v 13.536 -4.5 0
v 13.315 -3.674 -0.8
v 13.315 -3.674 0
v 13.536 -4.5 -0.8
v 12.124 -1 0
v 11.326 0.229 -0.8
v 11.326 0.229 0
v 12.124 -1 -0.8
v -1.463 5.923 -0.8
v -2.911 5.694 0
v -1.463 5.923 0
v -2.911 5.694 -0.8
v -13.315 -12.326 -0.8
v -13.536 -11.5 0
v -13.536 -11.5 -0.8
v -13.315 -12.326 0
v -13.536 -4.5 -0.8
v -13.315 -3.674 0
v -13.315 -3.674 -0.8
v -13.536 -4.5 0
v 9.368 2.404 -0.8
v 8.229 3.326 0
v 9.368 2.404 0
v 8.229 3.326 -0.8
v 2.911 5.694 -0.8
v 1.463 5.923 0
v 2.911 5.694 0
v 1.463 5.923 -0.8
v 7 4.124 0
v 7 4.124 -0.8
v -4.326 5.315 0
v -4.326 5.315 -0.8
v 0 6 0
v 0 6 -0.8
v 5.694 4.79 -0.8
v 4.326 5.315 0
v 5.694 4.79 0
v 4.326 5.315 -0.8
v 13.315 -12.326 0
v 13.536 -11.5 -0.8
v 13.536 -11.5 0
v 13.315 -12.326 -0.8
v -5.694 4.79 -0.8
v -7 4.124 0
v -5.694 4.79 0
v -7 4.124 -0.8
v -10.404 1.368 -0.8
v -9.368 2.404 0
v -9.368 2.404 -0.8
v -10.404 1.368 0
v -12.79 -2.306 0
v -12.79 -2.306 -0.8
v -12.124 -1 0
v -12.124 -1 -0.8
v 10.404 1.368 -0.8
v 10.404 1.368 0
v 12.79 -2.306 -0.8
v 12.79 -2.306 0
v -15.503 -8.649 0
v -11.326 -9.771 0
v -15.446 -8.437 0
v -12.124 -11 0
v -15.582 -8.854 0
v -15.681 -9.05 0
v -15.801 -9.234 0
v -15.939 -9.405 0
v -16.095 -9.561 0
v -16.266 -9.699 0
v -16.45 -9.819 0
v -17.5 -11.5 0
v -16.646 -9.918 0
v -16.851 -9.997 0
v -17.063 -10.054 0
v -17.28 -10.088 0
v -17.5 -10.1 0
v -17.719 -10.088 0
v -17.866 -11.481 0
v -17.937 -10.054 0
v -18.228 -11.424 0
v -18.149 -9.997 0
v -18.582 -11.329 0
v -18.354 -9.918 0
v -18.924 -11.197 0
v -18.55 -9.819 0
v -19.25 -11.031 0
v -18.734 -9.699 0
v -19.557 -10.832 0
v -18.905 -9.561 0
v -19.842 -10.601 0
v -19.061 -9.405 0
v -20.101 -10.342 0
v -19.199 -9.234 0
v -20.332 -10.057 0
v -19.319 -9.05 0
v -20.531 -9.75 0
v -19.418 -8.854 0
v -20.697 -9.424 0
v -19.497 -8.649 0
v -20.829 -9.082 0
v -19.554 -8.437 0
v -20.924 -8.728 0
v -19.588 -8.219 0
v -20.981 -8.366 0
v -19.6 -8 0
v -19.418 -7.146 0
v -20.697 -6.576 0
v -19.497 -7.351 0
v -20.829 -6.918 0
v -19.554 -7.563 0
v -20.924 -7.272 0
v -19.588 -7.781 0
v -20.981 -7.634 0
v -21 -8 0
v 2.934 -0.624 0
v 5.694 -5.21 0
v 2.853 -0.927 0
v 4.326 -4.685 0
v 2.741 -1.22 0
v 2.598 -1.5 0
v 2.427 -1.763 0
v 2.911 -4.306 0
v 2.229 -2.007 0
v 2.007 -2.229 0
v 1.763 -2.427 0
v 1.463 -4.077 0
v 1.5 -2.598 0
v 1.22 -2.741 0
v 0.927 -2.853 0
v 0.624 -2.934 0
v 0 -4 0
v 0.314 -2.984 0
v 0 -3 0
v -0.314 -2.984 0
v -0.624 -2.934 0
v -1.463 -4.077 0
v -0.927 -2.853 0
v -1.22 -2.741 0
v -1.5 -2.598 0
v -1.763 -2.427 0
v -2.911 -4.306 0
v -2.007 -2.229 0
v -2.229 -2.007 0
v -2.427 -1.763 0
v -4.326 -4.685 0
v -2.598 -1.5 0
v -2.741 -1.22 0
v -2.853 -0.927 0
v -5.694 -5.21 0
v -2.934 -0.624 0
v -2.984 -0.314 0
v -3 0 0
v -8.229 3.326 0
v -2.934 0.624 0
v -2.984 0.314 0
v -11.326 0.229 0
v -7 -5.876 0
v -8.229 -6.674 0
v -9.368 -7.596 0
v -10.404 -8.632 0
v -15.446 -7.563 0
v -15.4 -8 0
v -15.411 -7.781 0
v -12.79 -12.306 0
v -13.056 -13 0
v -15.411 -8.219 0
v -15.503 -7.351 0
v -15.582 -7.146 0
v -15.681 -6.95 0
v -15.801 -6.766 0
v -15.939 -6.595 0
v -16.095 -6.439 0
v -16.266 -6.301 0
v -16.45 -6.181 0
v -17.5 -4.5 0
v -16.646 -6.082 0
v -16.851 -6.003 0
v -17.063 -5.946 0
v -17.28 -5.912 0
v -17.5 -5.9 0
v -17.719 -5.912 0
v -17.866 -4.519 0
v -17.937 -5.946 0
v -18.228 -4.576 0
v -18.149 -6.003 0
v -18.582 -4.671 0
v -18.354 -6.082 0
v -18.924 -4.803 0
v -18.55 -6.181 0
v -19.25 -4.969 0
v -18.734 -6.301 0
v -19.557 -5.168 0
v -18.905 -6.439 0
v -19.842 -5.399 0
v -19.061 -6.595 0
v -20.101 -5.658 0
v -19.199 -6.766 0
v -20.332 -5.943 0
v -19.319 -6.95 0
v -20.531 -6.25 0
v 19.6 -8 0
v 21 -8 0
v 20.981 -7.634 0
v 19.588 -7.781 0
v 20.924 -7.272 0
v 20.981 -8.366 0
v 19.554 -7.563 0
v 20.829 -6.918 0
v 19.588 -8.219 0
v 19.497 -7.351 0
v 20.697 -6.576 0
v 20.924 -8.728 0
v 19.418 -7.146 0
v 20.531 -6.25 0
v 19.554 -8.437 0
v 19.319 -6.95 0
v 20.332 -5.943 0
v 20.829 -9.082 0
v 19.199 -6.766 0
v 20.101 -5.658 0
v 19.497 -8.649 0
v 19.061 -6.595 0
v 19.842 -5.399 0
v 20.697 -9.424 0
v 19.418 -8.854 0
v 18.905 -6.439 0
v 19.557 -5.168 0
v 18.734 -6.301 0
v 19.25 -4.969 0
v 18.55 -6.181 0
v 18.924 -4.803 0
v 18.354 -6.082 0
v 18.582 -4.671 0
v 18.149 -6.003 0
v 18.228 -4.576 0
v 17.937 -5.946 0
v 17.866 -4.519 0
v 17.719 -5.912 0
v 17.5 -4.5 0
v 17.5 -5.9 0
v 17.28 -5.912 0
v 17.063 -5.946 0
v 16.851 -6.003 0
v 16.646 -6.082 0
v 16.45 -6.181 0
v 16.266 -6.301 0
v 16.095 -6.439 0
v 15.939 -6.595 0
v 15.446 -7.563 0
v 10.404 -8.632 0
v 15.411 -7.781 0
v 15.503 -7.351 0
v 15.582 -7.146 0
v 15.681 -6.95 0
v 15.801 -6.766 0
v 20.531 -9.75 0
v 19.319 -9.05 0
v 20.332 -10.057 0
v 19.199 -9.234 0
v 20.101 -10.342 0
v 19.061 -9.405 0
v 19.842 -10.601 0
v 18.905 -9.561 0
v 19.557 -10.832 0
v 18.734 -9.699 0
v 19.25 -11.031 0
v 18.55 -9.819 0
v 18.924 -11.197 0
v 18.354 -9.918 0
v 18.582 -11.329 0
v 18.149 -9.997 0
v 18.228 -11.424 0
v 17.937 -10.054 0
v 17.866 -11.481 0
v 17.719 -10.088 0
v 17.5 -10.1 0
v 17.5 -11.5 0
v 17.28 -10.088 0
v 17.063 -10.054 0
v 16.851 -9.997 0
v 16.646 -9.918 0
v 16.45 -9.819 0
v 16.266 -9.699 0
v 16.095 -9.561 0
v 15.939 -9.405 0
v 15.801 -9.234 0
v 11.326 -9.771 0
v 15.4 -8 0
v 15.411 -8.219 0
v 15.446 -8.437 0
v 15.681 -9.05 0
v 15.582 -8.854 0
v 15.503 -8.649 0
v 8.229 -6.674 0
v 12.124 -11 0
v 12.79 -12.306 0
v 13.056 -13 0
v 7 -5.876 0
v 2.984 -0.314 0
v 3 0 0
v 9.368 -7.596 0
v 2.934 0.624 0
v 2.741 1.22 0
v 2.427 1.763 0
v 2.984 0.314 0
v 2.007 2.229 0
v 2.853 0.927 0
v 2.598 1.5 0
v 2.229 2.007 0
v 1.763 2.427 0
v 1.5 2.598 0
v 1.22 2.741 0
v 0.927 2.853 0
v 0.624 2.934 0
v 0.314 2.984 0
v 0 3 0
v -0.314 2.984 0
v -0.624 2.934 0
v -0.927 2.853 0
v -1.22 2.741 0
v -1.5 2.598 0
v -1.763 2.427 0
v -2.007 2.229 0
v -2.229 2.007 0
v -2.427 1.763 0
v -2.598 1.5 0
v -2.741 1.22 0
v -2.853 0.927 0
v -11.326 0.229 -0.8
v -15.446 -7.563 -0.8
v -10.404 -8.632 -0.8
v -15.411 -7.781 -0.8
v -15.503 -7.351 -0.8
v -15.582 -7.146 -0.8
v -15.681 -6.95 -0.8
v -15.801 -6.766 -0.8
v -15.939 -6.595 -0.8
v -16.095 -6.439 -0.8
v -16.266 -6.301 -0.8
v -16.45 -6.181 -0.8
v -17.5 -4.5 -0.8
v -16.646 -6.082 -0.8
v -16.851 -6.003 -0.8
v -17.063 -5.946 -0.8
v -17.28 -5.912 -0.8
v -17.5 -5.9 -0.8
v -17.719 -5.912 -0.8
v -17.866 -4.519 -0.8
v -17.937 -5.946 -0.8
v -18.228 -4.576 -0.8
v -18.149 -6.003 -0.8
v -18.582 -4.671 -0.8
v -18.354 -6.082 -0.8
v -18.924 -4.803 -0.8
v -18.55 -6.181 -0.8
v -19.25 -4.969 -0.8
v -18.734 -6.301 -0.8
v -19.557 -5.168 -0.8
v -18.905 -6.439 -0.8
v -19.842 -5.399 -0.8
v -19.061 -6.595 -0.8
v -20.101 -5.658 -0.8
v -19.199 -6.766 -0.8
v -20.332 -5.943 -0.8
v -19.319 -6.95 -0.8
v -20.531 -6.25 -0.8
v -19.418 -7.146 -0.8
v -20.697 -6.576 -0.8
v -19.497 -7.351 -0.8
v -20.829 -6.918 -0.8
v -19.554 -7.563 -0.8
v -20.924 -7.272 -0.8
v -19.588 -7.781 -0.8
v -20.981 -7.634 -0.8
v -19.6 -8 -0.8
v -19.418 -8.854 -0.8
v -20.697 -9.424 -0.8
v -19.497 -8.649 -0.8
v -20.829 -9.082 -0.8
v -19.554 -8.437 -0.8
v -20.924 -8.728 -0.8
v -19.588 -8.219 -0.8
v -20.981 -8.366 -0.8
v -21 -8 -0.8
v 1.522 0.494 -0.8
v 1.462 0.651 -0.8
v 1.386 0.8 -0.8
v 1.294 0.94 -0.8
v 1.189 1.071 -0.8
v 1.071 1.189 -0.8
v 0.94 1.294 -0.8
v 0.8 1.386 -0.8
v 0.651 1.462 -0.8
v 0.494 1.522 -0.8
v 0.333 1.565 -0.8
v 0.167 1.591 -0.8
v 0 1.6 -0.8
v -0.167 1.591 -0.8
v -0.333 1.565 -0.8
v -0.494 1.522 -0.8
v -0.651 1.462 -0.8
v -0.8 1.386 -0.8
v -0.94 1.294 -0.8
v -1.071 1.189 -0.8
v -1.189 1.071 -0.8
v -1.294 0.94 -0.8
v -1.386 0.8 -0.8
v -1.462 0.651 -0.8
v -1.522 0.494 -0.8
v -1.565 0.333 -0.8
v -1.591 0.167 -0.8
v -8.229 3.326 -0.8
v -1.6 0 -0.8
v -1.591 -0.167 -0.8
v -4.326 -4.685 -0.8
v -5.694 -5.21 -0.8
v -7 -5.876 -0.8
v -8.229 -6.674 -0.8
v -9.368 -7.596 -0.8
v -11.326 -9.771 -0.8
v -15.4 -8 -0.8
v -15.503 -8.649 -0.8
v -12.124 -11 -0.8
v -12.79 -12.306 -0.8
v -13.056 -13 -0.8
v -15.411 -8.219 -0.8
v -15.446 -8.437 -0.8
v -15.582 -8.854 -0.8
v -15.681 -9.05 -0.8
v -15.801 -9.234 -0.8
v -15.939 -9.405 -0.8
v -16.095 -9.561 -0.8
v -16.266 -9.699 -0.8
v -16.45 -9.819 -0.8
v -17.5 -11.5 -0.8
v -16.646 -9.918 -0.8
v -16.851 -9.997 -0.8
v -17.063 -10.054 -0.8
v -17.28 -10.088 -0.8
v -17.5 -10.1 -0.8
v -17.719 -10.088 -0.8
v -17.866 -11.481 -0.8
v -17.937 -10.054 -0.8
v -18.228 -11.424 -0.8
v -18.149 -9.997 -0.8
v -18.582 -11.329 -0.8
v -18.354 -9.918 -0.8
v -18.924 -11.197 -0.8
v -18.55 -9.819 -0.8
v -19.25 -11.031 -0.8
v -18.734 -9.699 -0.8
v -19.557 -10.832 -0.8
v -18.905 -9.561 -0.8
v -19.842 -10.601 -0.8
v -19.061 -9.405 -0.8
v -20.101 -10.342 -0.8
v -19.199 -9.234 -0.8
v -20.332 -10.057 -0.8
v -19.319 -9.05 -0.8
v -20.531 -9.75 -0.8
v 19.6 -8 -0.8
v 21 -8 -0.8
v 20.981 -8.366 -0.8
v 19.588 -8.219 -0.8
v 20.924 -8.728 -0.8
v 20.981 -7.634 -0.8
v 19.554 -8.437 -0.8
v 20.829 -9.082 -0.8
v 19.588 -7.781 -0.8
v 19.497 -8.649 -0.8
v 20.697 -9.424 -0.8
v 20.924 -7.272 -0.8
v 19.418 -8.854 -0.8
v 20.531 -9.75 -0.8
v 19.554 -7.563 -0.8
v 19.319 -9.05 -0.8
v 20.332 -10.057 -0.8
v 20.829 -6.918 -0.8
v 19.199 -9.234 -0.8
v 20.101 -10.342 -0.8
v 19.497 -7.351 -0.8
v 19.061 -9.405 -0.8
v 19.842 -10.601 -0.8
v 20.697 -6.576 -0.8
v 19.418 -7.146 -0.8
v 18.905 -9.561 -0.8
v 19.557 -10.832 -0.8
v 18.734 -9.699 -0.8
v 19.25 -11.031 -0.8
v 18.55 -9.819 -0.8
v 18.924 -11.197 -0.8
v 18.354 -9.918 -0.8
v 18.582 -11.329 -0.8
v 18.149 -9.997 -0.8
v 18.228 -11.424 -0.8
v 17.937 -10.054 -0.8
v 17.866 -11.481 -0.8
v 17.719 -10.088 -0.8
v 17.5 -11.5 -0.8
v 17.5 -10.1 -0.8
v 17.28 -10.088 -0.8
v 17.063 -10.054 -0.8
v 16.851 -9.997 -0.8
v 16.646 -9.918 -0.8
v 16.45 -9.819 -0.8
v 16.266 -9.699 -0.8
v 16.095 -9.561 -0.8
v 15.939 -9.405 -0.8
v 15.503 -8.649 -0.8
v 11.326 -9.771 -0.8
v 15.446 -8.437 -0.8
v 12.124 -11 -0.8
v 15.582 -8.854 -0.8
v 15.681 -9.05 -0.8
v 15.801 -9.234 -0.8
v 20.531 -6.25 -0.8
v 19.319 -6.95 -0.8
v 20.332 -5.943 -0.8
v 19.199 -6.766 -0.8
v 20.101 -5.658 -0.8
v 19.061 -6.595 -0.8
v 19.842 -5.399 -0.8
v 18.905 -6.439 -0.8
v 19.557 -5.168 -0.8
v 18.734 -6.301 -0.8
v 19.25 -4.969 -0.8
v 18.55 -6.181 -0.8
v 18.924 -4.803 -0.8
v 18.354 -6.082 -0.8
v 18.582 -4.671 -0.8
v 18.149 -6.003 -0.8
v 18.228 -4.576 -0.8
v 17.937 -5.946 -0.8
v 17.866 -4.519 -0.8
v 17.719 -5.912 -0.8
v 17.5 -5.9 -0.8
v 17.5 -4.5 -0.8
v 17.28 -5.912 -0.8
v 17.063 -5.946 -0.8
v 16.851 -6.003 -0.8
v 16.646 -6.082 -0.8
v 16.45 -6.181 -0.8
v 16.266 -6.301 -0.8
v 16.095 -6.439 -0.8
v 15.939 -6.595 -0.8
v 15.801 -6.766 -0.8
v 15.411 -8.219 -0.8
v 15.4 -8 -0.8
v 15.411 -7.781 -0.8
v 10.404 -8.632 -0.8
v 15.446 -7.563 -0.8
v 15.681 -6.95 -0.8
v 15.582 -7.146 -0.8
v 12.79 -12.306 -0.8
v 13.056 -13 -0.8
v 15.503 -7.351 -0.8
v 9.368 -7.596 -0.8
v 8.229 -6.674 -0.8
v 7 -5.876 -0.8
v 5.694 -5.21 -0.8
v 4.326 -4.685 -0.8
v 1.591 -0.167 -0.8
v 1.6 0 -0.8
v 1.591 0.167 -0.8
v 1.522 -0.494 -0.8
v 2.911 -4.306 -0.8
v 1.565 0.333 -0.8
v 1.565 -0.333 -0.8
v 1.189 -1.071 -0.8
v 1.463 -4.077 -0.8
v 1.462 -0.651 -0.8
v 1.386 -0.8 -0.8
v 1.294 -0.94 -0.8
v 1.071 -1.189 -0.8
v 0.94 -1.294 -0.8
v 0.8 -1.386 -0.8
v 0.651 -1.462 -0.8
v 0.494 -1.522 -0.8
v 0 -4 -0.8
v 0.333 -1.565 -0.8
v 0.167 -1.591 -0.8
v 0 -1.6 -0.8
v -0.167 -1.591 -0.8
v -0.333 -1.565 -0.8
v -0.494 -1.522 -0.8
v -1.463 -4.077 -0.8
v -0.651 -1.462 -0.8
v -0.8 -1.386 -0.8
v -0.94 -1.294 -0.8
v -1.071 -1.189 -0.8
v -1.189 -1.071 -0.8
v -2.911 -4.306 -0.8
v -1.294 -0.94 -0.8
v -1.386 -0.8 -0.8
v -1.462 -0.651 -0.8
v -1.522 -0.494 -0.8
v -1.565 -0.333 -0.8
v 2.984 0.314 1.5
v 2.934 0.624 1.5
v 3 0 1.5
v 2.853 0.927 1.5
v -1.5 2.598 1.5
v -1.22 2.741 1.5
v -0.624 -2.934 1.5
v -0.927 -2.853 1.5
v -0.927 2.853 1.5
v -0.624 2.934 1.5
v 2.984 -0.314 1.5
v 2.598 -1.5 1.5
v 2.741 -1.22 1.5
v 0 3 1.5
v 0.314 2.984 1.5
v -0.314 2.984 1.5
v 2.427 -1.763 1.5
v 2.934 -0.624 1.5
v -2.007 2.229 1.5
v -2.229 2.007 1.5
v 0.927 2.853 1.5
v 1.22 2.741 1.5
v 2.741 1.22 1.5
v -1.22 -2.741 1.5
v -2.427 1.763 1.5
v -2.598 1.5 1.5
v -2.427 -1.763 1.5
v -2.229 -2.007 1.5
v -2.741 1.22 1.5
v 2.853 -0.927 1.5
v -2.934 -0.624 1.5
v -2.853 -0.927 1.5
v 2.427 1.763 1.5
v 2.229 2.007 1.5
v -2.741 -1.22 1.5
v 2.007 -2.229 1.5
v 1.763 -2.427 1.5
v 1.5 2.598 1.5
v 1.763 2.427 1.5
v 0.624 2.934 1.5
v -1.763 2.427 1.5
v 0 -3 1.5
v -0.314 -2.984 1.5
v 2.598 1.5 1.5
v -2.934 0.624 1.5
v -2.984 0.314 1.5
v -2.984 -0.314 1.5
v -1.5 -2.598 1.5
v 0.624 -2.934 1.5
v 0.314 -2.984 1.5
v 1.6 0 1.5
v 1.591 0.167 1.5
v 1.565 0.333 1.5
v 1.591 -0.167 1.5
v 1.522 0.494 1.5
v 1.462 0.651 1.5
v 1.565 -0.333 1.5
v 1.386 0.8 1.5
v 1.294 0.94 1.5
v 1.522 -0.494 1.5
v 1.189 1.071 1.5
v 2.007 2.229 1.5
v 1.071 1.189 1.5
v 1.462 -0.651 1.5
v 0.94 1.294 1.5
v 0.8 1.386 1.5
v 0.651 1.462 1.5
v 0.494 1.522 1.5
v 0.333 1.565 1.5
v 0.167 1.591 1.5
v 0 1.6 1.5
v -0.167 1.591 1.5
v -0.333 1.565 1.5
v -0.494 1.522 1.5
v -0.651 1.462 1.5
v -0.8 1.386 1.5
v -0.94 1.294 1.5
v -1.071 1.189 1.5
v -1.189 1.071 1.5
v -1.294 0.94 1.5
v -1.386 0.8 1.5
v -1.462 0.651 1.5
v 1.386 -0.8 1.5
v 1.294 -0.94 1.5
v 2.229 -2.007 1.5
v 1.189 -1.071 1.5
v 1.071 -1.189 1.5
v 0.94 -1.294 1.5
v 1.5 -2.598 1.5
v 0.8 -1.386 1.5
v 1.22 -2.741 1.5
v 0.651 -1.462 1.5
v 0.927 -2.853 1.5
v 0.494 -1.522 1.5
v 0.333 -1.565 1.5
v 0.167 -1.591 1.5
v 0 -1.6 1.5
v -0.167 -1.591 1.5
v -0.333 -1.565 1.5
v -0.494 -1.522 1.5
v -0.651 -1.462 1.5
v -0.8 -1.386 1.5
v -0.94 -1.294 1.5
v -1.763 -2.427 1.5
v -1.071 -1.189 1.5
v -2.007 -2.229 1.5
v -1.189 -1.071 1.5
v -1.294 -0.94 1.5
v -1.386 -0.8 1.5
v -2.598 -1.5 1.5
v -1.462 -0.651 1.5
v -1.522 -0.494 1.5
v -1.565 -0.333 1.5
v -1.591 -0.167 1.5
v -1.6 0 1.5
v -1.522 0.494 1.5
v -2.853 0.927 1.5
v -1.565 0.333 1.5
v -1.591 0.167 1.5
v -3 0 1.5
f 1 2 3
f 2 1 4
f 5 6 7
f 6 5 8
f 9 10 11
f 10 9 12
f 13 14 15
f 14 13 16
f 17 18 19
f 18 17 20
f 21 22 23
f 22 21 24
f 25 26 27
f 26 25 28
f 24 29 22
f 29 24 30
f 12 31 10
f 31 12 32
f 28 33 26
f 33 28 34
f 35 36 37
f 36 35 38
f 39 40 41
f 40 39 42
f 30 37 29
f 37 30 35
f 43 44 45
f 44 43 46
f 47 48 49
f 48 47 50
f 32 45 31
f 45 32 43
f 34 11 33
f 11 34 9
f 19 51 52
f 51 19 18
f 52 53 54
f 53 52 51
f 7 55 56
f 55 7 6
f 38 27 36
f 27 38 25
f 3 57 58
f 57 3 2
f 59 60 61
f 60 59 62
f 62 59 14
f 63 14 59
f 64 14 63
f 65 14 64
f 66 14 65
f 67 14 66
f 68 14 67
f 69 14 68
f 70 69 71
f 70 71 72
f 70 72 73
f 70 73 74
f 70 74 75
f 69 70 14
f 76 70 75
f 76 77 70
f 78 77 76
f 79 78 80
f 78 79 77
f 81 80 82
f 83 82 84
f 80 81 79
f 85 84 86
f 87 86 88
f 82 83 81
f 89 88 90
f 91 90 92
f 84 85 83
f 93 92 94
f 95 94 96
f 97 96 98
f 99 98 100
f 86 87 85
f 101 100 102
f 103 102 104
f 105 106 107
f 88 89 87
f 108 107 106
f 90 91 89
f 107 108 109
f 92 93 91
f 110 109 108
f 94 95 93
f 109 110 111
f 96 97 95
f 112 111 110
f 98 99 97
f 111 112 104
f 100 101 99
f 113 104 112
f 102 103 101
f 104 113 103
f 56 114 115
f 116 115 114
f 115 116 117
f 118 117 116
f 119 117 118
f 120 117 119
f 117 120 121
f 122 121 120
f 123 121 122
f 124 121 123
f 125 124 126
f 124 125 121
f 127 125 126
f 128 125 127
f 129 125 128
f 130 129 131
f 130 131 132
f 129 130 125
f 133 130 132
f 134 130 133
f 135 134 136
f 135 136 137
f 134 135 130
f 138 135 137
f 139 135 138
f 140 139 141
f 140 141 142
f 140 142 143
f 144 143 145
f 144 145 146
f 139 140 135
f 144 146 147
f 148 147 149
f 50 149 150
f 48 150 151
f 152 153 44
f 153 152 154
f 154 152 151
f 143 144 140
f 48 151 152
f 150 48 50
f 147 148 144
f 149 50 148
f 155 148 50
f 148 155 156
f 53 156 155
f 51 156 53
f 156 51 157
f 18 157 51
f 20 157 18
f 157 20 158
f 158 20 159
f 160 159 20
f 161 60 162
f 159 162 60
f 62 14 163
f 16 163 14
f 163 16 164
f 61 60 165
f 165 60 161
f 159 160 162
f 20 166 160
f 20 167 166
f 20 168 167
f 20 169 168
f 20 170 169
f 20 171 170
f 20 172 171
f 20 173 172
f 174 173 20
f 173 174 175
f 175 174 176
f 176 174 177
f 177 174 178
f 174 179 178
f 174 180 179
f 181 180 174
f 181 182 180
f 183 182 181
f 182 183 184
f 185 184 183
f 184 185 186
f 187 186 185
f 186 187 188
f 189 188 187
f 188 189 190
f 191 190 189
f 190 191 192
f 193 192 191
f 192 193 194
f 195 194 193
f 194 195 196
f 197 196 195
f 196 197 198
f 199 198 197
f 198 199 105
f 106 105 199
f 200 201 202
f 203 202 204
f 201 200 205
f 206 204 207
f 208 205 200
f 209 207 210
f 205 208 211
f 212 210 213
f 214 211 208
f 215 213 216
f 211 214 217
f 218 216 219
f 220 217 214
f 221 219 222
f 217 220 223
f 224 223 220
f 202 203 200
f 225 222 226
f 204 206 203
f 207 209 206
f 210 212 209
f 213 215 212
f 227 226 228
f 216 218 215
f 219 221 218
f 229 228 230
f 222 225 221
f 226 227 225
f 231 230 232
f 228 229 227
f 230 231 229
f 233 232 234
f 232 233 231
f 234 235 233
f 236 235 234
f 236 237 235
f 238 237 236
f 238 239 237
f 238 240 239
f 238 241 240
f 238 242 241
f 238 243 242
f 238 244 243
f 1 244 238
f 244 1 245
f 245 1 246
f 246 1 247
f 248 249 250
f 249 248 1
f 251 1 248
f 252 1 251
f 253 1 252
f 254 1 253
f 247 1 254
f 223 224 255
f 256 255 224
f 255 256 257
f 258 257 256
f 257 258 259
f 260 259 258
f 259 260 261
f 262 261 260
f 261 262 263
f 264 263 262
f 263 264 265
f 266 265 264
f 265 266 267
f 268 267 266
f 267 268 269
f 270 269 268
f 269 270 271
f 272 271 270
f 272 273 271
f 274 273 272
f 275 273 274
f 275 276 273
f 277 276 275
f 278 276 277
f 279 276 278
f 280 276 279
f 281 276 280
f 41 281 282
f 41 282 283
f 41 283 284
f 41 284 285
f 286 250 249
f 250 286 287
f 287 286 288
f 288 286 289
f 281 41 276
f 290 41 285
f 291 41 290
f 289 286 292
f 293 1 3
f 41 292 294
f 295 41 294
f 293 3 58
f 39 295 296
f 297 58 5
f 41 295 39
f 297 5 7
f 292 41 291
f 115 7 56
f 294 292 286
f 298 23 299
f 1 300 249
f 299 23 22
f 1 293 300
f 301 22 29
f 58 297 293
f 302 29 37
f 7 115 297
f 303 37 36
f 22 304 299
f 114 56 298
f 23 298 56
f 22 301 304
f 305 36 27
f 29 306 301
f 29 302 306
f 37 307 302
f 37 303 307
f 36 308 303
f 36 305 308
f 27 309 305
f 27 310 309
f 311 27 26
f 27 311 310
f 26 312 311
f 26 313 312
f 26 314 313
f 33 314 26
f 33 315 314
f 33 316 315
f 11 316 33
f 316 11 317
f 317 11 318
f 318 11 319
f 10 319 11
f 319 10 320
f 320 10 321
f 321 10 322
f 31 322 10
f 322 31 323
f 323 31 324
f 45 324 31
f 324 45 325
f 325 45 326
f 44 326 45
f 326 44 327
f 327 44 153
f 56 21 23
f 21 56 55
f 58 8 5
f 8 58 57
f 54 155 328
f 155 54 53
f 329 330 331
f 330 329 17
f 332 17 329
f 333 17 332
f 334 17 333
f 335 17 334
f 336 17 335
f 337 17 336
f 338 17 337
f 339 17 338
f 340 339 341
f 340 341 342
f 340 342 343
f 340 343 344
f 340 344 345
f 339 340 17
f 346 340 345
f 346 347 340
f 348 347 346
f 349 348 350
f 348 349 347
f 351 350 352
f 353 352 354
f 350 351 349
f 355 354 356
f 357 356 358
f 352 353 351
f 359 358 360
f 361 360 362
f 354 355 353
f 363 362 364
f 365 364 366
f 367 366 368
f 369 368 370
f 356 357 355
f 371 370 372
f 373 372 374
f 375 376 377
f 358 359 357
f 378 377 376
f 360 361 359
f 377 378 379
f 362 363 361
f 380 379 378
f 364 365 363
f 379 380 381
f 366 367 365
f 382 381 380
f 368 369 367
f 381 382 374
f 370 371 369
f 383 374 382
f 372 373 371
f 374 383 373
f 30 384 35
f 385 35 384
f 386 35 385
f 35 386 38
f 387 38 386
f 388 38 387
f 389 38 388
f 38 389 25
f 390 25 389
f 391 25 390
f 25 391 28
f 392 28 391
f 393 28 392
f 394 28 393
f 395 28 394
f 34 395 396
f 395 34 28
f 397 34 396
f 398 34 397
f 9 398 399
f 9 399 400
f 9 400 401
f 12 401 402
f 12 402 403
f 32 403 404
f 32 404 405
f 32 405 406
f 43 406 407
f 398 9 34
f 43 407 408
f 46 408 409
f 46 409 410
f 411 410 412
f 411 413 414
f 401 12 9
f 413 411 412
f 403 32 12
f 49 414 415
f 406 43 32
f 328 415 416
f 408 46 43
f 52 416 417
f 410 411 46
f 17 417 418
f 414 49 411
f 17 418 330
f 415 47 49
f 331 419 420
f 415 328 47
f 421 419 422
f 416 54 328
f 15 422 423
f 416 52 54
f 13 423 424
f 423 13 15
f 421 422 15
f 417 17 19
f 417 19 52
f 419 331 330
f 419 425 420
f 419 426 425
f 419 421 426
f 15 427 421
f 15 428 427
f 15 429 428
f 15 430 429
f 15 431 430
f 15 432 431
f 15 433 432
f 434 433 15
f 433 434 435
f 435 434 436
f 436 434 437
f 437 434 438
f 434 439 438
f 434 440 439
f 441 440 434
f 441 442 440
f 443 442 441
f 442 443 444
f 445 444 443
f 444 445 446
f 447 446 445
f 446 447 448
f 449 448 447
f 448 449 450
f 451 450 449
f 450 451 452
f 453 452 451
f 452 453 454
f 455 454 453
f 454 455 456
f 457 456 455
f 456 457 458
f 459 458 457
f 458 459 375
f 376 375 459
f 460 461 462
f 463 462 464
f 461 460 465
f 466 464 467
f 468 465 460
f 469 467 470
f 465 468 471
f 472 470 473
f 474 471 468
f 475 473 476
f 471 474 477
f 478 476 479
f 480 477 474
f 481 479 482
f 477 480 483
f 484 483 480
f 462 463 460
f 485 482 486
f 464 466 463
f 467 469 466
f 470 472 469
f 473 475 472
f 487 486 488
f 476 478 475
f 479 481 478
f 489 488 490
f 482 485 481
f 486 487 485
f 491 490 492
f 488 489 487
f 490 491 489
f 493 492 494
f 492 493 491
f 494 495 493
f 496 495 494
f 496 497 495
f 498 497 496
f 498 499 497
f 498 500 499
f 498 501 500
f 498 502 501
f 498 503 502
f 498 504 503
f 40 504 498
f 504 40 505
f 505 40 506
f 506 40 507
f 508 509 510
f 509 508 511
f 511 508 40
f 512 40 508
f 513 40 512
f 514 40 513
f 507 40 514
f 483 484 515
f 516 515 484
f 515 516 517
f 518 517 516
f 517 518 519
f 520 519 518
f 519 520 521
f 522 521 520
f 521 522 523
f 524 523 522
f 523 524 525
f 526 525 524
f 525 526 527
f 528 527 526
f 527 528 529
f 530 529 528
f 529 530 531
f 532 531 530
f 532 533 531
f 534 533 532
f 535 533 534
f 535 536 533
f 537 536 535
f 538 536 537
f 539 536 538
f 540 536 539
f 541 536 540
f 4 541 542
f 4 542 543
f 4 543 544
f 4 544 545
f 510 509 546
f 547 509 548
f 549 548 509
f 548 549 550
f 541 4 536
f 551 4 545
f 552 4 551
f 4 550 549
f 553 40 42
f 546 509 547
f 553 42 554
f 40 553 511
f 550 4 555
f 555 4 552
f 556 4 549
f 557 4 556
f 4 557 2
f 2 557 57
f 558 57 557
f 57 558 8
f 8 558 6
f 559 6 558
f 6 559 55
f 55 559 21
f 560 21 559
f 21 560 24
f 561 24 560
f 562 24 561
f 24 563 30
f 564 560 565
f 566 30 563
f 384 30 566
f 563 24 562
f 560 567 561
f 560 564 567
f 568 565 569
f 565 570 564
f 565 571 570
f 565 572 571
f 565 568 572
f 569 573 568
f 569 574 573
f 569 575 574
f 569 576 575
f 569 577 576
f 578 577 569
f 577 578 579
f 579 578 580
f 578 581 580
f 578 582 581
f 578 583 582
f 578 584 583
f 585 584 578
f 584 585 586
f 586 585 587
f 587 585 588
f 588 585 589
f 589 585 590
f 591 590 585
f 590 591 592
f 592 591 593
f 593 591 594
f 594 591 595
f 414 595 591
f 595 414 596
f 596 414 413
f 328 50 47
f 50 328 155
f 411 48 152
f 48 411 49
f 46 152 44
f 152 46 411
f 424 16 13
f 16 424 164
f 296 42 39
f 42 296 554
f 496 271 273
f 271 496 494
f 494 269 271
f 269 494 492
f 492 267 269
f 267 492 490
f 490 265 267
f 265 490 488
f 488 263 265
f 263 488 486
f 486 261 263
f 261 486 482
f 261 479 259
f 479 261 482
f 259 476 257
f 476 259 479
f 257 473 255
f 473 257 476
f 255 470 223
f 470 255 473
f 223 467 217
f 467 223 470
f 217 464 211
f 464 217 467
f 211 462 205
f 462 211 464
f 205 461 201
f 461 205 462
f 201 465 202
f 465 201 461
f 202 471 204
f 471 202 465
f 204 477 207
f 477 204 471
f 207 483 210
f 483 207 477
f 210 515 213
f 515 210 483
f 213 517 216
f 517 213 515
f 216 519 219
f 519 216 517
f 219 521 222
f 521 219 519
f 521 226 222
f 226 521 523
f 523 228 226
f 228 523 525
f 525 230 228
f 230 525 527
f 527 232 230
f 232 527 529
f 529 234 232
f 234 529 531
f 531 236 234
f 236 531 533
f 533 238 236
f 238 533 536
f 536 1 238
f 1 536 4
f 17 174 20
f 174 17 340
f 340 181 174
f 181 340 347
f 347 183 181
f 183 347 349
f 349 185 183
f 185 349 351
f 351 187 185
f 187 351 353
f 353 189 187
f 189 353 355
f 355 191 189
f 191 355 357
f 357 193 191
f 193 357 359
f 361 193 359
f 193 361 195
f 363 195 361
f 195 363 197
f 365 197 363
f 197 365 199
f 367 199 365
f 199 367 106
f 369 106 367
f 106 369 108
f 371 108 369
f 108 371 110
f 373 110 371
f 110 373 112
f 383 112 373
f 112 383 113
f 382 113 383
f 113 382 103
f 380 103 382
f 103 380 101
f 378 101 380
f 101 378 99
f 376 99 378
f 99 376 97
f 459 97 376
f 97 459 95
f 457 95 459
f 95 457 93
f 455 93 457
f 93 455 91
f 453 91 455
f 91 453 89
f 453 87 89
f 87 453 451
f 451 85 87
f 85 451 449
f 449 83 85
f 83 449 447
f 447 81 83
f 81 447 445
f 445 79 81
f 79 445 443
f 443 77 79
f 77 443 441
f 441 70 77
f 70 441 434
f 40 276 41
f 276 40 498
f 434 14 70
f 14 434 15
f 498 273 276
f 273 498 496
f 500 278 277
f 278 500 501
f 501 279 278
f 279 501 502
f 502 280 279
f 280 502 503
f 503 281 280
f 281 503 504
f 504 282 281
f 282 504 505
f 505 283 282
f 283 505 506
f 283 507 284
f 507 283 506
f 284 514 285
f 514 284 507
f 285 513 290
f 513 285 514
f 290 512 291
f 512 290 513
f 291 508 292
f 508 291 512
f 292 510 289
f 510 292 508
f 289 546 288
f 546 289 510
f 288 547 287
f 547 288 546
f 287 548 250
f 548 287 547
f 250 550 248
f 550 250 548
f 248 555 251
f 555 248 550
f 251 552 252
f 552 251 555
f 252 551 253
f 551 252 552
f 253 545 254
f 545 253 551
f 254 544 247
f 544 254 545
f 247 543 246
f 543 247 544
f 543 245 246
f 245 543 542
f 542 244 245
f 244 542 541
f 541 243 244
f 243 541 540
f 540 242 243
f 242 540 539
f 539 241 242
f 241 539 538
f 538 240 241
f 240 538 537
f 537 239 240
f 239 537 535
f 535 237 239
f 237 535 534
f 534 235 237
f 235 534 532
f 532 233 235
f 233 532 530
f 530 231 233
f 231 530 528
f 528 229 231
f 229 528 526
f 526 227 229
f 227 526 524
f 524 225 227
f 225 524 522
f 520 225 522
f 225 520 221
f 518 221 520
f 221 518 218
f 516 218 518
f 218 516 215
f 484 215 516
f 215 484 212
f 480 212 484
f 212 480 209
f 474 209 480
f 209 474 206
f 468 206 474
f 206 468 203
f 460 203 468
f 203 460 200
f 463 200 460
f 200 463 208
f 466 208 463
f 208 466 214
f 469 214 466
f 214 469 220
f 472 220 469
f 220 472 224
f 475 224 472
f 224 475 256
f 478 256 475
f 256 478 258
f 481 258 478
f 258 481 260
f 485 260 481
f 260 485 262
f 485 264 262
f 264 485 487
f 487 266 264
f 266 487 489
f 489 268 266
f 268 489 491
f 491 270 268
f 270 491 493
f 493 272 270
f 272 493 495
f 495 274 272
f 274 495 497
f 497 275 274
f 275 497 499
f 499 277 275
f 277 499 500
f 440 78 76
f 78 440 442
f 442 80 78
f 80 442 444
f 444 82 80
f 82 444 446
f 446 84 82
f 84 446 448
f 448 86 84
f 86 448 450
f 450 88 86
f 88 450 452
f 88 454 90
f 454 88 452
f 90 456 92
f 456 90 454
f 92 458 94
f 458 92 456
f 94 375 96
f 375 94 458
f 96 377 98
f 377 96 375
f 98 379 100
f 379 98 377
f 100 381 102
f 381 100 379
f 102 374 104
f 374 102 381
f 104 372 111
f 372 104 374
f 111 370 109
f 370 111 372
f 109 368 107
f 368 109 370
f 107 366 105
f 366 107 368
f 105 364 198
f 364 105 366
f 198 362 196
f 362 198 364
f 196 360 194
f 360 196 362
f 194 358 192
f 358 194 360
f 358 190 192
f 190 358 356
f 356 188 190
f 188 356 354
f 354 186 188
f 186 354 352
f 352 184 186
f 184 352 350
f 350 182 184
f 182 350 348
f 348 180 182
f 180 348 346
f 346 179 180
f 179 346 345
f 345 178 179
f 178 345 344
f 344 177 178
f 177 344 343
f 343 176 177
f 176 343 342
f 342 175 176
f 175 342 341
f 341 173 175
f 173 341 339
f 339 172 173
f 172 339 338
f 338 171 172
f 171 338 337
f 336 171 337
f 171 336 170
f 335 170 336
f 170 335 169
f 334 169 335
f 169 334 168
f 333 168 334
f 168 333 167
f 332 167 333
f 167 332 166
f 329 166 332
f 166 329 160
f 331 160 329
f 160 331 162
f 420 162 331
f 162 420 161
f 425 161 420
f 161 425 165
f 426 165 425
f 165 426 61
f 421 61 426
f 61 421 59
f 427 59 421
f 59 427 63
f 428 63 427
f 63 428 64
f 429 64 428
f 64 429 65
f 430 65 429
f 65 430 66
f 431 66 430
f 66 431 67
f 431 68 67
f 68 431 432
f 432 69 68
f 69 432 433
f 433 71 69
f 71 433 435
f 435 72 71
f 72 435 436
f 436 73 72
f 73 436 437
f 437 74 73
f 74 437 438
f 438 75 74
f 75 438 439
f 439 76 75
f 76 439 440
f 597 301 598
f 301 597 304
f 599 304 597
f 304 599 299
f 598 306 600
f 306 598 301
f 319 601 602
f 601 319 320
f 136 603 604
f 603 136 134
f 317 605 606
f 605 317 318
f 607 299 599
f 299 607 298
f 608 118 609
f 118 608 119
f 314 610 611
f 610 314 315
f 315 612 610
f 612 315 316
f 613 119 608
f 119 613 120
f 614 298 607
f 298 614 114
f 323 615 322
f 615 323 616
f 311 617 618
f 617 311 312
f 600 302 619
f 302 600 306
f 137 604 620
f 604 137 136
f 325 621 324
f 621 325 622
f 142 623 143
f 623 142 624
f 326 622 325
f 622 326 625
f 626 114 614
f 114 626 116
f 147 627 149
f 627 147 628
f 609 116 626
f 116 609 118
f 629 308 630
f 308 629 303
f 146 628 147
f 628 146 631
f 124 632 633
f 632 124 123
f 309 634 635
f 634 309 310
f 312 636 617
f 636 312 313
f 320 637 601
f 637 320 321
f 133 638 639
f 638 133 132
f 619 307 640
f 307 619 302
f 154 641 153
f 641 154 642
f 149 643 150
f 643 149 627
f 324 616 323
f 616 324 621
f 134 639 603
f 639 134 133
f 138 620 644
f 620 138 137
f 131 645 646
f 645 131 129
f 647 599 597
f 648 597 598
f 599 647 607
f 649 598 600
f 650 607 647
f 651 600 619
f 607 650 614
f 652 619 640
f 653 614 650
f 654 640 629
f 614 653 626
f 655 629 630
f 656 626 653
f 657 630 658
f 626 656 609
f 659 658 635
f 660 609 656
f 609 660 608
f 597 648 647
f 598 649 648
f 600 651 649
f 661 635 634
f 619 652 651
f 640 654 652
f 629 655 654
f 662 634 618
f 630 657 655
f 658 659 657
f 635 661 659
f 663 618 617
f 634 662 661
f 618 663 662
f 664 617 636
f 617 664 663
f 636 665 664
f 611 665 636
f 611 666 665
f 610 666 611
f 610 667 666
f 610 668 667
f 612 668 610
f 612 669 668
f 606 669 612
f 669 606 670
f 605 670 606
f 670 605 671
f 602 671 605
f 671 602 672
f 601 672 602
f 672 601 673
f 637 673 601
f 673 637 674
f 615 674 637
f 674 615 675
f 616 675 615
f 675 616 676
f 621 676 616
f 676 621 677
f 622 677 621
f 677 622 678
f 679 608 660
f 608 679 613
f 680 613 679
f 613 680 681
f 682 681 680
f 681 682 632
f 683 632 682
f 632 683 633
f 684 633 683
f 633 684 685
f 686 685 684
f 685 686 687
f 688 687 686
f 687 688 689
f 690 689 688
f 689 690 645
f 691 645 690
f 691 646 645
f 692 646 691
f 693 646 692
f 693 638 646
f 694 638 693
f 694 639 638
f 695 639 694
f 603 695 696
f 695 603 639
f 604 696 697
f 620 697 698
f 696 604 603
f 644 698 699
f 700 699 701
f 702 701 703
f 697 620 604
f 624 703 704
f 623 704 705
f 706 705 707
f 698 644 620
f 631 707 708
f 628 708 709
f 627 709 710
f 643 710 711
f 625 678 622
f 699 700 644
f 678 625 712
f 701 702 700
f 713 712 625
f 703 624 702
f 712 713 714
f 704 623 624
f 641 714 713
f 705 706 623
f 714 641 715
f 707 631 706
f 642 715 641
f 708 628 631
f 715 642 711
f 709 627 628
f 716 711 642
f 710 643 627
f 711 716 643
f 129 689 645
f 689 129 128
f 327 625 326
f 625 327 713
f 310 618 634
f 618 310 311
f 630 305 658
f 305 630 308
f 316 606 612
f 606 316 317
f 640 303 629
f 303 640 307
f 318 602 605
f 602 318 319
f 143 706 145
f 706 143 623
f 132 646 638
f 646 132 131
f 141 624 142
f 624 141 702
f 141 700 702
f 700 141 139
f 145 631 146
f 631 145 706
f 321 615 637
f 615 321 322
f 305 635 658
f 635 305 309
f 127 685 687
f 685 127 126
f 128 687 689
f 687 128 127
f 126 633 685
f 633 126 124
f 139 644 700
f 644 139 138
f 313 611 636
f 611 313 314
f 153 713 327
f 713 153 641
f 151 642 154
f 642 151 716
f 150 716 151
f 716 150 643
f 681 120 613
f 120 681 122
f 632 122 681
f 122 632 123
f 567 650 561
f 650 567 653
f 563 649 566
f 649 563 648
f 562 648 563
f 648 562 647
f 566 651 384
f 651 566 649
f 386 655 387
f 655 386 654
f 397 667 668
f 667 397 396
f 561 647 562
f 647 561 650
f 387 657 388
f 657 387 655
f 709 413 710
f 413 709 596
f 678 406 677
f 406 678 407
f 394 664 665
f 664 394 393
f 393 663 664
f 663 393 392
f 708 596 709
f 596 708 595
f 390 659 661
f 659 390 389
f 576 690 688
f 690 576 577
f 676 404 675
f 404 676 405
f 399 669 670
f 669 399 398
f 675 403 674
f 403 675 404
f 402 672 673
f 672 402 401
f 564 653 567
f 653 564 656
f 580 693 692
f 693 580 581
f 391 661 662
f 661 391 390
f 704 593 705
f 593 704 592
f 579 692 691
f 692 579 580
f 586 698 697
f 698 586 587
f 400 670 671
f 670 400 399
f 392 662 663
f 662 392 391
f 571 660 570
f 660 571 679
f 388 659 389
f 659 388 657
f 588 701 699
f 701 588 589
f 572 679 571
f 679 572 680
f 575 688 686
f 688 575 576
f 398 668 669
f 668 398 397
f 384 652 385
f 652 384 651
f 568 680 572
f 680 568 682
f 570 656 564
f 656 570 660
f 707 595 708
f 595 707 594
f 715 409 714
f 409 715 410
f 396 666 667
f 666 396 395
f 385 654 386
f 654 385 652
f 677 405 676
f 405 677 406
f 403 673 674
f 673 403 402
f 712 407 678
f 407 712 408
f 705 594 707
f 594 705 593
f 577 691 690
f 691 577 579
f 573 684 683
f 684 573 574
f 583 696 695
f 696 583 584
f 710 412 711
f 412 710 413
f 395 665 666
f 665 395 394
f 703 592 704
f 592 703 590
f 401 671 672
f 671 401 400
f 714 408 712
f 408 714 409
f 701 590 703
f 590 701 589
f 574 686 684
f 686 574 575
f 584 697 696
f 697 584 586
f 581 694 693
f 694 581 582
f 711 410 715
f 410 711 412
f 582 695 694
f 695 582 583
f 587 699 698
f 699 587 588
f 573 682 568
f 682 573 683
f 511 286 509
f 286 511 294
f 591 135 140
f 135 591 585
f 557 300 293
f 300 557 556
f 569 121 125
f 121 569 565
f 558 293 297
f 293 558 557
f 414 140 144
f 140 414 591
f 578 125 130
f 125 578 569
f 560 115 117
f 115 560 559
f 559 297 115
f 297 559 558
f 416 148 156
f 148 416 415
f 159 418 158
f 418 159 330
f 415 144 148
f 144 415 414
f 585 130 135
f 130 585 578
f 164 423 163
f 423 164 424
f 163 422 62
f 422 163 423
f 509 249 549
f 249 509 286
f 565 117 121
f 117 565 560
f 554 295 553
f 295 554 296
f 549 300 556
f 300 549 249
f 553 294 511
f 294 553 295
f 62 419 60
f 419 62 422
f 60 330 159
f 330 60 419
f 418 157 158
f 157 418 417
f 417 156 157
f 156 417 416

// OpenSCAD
/*
   Copyright 2015-2018 Scott Bezek and the splitflap contributors

   Licensed under the Apache License, Version 2.0 (the "License");
   you may not use this file except in compliance with the License.
   You may obtain a copy of the License at

       http://www.apache.org/licenses/LICENSE-2.0

   Unless required by applicable law or agreed to in writing, software
   distributed under the License is distributed on an "AS IS" BASIS,
   WITHOUT WARRANTIES OR CONDITIONS OF ANY KIND, either express or implied.
   See the License for the specific language governing permissions and
   limitations under the License.
*/

28byj48_chassis_radius = 28/2;
28byj48_chassis_height = 0.8;
28byj48_shaft_offset = 8;
28byj48_mount_outer_radius = 3.5;
28byj48_mount_hole_radius = 4.2/2;
28byj48_mount_center_offset = 35/2;
28byj48_mount_bracket_height = 0.8;

28byj48_shaft_collar_radius = 3;
28byj48_shaft_collar_height = 1.5;

28byj48_shaft_radius = 1.6;
28byj48_shaft_height = 10;
28byj48_shaft_slotted_width = 3;
28byj48_shaft_slotted_height = 6;

28byj48_backpack_width = 2.6;
28byj48_backpack_extent = 3; // seen values from 17-18
28byj48_backpack_height = 3;

// Basic 28BYJ-48 model based on various dimensioned drawings.
// Origin is centered on the shaft, on the front face of the motor, with the shaft in the +z direction
module Stepper28BYJ48() {
    $fn = 60;

    eps = 0.01;

    gray = [0.7, 0.7, 0.7];
    gold = [1, 0.843, 0];
    blue = [0, 0, 1];

    module mounting_holes() {
        linear_extrude(height=28byj48_mount_bracket_height) {
        difference() {
            hull() {
                translate([28byj48_mount_center_offset, 0]) {
                    circle(r=28byj48_mount_outer_radius);
                }
                translate([-28byj48_mount_center_offset, 0]) {
                    circle(r=28byj48_mount_outer_radius);
                }
            }

            translate([28byj48_mount_center_offset, 0]) {
                circle(r=28byj48_mount_hole_radius);
            }
            translate([-28byj48_mount_center_offset, 0]) {
                circle(r=28byj48_mount_hole_radius);
            }
        }
        }
    }

    module shaft_collar() {
        cylinder(r=28byj48_shaft_collar_radius, h=28byj48_shaft_collar_height + eps);
    }

    module shaft() {
        color(gold) {
            difference() {
                cylinder(r=28byj48_shaft_radius, h=28byj48_shaft_height);
                translate([-(28byj48_shaft_radius + eps), 28byj48_shaft_slotted_width / 2, 28byj48_shaft_height - 28byj48_shaft_slotted_height]) {
                    cube([(28byj48_shaft_radius+eps)*2, 28byj48_shaft_radius, 28byj48_shaft_slotted_height+eps]);
                }
                translate([-(28byj48_shaft_radius + eps), - 28byj48_shaft_radius - (28byj48_shaft_slotted_width / 2), 28byj48_shaft_height - 28byj48_shaft_slotted_height]) {
                    cube([(28byj48_shaft_radius+eps)*2, 28byj48_shaft_radius, 28byj48_shaft_slotted_height+eps]);
                }
            }
        }
    }

    module chassis() {
        color(gray) {
            
            translate([0, 0, -28byj48_chassis_height]) {
                cylinder(r=28byj48_chassis_radius, h=28byj48_chassis_height);
            }
            translate([0, 0, -28byj48_mount_bracket_height]) {
                mounting_holes();
            }
            translate([0, 28byj48_shaft_offset, -eps]) {
                shaft_collar();
            }
        }
    }

    module backpack() {
        color(blue) {
            translate([-28byj48_backpack_width/2, 0, -28byj48_backpack_height - eps]) {
                cube([28byj48_backpack_width, 28byj48_backpack_extent, 28byj48_backpack_height]);
            }
        }
    }

    translate([0, -28byj48_shaft_offset, 0]) {
        difference(){
        chassis();
        translate([0, 28byj48_shaft_offset, -1]) {
            shaft();
        }
        translate([0,-10,0])
        chassis();
        
    }
        
    }
}

Stepper28BYJ48();
